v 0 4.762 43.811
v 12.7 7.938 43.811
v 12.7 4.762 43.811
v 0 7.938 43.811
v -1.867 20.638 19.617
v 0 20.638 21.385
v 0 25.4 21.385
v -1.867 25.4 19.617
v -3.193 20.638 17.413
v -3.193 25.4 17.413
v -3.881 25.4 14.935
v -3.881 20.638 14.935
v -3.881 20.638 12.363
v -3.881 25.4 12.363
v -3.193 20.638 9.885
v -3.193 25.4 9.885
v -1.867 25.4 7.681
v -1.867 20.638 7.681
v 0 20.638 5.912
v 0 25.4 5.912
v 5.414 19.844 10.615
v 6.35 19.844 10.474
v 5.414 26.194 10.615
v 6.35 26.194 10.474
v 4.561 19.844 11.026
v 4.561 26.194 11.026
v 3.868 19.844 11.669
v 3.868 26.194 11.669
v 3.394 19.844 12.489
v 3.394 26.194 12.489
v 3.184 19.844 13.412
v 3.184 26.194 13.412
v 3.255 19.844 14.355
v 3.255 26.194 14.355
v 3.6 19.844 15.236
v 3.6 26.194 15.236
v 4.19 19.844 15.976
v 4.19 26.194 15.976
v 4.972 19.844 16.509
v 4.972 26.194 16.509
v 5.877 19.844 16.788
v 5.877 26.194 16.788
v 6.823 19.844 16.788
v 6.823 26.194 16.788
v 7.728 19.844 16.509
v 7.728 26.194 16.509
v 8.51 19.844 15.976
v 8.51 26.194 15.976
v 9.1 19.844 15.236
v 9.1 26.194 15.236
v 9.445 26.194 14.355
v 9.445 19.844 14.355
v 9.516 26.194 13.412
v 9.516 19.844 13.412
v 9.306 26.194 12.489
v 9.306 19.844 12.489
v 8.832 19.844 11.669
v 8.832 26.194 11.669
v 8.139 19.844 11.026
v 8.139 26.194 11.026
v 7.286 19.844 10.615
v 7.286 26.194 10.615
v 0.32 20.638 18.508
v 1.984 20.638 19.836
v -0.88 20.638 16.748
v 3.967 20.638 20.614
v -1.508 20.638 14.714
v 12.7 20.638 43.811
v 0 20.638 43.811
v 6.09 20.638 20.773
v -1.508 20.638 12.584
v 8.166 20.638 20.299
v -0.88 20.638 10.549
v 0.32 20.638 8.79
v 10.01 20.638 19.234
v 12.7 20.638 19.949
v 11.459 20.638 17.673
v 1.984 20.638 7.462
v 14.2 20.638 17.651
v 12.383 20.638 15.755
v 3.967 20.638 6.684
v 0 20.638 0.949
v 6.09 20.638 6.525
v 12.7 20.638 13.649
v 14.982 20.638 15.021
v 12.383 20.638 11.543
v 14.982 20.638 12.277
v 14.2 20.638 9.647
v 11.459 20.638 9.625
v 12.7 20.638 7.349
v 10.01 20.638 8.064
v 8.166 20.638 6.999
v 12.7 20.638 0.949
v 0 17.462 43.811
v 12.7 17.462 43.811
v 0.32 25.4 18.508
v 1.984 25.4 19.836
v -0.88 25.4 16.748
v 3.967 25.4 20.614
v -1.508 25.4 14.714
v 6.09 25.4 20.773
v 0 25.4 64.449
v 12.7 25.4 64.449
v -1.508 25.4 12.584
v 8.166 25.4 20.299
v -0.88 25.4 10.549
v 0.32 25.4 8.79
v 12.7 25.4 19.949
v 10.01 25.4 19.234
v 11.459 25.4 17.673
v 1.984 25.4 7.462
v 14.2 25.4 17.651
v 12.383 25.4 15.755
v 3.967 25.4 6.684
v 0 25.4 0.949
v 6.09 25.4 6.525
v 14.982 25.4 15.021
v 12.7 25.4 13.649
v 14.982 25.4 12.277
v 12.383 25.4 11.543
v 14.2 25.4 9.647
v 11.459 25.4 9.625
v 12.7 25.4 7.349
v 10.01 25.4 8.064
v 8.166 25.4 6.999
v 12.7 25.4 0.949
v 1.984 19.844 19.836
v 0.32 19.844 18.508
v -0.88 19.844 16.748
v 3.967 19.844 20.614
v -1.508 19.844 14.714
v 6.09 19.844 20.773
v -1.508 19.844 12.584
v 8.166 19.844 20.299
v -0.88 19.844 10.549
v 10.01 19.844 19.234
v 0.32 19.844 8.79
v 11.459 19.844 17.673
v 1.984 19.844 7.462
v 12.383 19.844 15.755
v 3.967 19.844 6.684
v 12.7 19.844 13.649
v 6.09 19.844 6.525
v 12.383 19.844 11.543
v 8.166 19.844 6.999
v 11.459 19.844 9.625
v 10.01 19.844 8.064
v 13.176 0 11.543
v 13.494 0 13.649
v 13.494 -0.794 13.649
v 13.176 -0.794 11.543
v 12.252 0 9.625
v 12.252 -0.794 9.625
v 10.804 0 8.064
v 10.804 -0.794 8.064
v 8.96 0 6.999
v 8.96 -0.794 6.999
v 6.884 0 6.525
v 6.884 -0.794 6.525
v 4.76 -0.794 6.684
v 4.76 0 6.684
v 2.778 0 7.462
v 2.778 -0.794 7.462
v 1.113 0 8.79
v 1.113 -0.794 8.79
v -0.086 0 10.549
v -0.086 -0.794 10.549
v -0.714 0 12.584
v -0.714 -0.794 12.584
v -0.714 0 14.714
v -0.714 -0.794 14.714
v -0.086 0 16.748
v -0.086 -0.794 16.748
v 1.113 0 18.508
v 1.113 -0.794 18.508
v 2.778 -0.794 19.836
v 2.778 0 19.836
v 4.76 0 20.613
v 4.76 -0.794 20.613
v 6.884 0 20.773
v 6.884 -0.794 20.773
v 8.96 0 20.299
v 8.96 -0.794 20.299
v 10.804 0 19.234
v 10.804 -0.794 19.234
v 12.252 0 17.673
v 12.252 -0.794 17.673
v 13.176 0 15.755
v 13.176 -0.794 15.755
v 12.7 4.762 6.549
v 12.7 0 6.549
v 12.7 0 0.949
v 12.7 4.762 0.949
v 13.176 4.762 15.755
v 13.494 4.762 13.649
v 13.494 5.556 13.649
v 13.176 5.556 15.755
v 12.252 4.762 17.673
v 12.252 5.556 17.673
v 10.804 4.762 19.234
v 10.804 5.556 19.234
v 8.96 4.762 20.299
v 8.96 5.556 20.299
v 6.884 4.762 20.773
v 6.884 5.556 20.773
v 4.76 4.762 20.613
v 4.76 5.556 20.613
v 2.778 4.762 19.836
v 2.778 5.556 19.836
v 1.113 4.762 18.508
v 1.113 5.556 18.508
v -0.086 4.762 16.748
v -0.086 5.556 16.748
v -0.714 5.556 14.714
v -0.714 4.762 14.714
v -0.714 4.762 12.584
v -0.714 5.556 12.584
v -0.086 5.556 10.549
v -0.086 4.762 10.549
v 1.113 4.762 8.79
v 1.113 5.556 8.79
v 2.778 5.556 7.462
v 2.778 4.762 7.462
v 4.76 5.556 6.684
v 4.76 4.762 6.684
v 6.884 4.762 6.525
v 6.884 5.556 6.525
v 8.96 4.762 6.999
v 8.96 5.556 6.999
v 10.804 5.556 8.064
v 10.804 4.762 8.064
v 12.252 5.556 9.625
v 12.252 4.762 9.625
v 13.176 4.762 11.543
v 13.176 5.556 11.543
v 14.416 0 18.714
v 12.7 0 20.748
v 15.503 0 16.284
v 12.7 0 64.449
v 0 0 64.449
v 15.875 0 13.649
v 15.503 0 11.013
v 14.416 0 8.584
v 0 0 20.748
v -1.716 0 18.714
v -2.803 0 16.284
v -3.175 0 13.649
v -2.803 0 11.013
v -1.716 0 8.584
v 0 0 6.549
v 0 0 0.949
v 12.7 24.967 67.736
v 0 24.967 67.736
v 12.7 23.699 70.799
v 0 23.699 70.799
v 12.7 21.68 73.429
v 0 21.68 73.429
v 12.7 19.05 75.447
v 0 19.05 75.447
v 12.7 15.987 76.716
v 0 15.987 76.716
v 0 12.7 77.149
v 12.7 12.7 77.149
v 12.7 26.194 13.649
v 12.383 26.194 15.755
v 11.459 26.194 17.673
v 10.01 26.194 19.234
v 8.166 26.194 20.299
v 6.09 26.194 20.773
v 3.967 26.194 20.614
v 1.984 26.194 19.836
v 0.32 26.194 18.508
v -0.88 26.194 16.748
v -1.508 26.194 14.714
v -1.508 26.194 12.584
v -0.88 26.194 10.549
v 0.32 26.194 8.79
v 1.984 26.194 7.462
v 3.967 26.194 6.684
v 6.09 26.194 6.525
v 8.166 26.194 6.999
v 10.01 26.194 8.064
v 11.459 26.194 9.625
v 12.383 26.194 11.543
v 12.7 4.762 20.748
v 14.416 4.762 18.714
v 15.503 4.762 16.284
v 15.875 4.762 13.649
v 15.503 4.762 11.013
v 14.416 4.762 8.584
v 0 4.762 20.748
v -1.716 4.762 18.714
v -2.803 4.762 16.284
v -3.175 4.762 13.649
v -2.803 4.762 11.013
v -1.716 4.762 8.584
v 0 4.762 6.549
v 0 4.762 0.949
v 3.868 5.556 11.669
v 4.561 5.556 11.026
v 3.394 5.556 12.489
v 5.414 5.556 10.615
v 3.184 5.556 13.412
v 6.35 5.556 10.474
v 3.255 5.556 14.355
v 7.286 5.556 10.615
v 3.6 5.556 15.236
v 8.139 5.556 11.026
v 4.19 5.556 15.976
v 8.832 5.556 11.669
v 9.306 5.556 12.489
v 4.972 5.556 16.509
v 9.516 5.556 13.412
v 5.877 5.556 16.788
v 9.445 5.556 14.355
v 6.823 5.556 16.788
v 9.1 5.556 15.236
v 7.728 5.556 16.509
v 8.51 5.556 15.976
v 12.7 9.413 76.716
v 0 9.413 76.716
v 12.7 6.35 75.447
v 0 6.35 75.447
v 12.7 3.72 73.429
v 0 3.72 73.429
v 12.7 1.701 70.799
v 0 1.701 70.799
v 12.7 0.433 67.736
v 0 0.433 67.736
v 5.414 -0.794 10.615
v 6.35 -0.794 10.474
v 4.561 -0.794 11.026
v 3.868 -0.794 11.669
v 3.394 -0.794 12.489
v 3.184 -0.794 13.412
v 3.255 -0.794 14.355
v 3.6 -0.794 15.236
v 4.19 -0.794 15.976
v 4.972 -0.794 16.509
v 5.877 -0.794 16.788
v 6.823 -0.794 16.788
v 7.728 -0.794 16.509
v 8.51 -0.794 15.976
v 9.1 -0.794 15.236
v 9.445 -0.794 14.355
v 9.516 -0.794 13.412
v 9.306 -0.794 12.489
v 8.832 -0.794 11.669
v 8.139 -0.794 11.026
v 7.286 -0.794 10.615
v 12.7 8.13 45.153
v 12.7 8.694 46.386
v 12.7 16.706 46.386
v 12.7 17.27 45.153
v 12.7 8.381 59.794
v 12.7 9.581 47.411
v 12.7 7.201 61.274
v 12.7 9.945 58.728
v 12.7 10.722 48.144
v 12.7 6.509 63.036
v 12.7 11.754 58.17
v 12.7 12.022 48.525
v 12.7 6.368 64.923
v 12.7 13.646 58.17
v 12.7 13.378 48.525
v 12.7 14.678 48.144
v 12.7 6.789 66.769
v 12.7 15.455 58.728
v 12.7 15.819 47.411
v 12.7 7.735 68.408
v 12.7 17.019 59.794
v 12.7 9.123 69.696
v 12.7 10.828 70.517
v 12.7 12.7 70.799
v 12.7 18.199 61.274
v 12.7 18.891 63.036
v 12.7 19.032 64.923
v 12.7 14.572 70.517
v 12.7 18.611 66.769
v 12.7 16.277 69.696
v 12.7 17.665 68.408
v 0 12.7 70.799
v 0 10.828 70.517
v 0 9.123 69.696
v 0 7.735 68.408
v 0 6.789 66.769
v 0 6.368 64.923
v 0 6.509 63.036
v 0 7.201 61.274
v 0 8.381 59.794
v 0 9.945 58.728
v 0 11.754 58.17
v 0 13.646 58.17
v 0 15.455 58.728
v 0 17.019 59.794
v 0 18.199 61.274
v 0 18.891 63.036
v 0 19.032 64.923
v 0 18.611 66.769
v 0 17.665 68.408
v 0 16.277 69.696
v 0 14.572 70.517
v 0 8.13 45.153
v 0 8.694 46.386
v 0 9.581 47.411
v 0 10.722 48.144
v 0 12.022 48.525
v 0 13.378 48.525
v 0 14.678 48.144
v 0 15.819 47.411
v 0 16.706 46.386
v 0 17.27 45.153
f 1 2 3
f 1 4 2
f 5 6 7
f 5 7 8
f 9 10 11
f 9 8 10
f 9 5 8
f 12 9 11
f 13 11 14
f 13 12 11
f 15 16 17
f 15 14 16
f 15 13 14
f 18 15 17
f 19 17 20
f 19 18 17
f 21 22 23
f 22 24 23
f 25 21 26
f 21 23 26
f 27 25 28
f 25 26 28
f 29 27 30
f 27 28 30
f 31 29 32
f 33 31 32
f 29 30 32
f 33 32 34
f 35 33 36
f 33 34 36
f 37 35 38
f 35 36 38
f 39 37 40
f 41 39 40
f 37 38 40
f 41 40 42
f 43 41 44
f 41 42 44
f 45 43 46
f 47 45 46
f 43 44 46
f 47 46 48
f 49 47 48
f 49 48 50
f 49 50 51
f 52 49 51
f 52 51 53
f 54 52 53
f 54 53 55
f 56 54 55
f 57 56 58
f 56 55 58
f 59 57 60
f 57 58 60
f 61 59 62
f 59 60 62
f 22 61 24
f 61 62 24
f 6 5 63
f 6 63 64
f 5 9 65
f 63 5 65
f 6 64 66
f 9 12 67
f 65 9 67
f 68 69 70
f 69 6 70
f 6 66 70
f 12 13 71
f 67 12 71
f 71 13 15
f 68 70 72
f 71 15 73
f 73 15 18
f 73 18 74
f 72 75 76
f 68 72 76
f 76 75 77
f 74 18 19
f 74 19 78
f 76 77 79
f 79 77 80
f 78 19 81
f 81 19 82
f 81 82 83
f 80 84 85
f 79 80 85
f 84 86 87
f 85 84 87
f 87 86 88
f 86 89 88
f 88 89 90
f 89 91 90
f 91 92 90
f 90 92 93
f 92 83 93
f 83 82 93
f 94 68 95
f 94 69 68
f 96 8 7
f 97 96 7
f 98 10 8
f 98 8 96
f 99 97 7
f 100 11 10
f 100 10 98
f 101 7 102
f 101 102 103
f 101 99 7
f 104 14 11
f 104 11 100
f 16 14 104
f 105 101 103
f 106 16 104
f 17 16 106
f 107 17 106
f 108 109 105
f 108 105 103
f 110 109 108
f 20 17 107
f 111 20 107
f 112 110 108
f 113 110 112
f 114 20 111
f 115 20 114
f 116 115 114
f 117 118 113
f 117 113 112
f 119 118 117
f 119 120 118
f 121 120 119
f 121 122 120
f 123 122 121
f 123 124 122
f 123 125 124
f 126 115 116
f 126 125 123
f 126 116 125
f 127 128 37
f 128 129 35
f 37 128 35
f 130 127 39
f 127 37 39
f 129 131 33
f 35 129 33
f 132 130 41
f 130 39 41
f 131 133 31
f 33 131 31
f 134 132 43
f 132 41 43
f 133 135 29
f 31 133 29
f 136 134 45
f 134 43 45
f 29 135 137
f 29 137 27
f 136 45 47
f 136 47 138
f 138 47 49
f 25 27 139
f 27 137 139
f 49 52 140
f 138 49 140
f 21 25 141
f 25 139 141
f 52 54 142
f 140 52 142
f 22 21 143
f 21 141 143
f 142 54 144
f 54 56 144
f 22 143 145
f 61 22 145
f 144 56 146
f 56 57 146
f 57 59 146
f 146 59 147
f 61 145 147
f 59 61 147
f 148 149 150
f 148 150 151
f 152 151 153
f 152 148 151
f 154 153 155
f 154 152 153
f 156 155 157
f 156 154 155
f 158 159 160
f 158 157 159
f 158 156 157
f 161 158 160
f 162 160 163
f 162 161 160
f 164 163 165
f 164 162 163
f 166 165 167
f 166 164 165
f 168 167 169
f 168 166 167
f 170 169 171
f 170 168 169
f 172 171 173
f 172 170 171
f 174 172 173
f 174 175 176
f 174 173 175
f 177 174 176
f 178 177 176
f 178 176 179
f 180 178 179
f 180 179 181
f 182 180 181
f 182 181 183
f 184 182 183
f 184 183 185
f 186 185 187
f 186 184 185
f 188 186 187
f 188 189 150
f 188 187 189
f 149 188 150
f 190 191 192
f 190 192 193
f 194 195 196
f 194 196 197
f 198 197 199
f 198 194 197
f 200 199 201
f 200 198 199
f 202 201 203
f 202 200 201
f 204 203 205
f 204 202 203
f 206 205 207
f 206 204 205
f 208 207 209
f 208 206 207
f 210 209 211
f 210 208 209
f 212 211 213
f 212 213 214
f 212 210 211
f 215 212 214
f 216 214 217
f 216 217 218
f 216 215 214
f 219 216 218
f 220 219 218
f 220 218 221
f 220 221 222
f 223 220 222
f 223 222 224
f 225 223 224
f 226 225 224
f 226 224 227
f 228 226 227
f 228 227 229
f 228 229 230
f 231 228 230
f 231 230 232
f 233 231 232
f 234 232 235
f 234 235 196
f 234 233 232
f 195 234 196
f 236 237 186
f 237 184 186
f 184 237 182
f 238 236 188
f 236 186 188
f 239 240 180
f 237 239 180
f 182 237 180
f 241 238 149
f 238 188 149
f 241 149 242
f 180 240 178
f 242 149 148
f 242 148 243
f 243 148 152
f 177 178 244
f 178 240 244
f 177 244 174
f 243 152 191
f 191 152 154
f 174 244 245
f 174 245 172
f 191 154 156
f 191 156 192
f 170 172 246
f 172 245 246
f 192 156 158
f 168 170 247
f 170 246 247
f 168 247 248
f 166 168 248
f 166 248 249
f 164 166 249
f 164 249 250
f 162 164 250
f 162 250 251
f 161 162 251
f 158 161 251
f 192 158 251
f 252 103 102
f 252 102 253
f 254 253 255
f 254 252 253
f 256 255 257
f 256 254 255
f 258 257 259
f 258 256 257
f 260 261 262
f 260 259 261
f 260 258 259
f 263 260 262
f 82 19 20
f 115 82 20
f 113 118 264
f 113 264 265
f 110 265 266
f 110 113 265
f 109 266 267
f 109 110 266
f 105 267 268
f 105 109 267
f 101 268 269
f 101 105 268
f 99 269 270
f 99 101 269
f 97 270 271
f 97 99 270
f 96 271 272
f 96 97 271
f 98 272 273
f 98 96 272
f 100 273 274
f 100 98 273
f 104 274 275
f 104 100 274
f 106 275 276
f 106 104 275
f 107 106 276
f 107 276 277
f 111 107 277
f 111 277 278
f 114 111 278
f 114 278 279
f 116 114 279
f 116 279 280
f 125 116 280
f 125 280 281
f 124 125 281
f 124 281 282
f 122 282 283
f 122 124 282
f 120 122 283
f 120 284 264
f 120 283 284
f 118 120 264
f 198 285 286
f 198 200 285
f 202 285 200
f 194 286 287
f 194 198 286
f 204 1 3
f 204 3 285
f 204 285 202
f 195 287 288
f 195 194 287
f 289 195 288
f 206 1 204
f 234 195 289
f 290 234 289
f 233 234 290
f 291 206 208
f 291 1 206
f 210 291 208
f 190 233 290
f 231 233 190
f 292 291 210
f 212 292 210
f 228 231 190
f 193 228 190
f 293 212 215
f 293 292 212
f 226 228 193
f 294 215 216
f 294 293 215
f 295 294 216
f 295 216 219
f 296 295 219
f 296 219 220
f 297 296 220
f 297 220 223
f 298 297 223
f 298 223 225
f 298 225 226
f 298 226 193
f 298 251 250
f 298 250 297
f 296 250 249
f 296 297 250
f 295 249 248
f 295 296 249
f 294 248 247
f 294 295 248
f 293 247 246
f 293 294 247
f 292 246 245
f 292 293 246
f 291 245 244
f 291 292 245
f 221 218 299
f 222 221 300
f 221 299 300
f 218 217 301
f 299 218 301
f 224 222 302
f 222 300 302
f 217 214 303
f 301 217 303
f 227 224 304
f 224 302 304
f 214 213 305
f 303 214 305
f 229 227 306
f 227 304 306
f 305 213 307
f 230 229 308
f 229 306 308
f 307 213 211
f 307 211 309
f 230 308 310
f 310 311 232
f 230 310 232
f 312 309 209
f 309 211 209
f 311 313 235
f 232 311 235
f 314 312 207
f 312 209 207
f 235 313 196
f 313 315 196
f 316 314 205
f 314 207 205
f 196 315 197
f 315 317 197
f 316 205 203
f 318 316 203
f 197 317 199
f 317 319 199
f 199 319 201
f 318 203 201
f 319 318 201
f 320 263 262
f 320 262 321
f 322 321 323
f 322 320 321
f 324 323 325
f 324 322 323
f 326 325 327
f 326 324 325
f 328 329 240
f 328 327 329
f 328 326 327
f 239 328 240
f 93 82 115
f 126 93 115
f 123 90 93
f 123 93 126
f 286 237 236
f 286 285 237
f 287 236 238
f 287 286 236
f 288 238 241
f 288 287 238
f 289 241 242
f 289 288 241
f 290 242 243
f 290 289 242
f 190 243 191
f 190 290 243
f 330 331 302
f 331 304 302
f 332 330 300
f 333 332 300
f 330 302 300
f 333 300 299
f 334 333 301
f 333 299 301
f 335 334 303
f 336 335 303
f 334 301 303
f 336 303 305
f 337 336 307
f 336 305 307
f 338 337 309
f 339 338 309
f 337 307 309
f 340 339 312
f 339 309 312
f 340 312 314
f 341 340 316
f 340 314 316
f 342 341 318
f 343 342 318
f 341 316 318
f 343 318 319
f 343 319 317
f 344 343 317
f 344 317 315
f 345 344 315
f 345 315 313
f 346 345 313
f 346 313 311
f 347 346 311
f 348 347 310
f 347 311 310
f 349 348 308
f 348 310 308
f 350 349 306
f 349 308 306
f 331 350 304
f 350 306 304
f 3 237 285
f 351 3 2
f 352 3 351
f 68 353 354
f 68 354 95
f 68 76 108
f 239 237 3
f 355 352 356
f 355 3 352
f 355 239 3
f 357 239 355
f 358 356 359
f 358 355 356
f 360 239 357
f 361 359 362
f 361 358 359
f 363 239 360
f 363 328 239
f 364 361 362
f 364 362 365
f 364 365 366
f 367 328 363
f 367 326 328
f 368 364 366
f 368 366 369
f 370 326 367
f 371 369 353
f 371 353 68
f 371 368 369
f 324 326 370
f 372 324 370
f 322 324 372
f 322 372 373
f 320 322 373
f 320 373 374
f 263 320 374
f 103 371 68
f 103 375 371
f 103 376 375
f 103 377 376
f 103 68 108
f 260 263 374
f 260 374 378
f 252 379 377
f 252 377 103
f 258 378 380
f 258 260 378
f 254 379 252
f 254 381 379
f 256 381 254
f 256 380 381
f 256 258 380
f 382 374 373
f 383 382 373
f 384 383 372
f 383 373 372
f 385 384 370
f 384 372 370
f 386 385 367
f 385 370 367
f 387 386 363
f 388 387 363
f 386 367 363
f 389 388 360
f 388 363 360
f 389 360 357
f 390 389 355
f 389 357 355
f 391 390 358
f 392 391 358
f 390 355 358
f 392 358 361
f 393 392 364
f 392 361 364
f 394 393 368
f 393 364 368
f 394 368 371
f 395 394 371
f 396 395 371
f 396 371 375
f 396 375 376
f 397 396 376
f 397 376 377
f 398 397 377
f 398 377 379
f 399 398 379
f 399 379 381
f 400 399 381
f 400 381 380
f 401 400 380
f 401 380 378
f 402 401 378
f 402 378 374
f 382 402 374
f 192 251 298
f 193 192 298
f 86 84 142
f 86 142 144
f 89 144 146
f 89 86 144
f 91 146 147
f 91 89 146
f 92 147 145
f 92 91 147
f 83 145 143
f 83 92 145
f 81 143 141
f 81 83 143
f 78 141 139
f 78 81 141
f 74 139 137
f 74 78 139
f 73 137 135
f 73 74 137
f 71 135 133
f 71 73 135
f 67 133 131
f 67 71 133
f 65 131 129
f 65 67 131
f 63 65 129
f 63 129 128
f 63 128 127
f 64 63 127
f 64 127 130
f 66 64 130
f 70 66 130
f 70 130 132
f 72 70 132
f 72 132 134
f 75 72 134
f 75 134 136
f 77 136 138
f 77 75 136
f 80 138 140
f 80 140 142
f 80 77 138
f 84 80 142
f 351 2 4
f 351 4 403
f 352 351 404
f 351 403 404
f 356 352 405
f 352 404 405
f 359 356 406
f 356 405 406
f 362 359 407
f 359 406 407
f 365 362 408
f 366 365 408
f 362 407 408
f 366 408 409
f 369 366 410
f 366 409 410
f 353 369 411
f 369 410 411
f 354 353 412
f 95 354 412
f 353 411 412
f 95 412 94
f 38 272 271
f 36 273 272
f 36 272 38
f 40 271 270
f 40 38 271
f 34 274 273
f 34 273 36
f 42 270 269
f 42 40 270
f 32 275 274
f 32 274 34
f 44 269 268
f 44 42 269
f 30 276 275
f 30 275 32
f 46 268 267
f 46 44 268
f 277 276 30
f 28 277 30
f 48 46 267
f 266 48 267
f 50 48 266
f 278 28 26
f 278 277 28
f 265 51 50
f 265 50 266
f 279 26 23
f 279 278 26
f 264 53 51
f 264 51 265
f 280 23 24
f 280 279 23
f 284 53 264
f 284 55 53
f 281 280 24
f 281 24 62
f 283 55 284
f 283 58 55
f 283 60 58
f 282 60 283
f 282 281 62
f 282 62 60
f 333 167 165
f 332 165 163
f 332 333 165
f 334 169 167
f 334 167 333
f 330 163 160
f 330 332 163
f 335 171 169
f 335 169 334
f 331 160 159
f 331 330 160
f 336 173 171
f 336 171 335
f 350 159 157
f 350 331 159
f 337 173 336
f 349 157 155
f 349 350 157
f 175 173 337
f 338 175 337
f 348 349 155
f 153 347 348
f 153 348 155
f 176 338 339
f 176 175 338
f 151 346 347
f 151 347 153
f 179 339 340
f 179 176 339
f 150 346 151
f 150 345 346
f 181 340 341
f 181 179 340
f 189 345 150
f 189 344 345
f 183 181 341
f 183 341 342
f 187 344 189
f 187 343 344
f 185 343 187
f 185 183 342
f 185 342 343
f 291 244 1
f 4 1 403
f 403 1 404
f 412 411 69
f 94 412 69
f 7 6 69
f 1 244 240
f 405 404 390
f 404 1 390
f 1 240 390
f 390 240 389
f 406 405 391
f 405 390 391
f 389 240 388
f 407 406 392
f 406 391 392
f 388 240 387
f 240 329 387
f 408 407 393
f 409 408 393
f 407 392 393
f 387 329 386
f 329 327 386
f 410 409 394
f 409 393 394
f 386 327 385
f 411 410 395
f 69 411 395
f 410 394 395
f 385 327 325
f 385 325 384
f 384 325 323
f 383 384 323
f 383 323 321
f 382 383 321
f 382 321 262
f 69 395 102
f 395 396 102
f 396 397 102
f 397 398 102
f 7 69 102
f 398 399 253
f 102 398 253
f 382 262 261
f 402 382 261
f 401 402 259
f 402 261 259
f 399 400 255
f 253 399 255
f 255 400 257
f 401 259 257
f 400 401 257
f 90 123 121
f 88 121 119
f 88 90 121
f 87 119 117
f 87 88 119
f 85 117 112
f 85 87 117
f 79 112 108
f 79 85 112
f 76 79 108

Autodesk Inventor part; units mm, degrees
ref_plane "YZ Plane" through (0, 0, 0) normal (1, 0, 0) x (0, 1, 0)
ref_plane "XZ Plane" through (0, 0, 0) normal (0, 1, 0) x (-1, 0, 0)
ref_plane "XY Plane" through (0, 0, 0) normal (0, 0, 1) x (1, 0, 0)
sketch "Sketch1" plane through (0, 0, 0) normal (1, 0, 0) x (0, 1, 0)
  line L0 (0, 0.9489) -> (25.4, 0.9489)
  line L1 (25.4, 0.9489) -> (25.4, 77.1489)
  line L2 (25.4, 77.1489) -> (0, 77.1489)
  line L3 (0, 77.1489) -> (0, 0.9489)
  point P0 (0, 0)
  dimension "d0" = 25.4
  dimension "d1" = 76.2
extrude "Extrusion1" add sketch "Sketch1" along normal blind 12.7
sketch "Sketch2" plane through (0, 0, 0) normal (-1, 0, 0) x (0, 0, 1)
  line L0 (77.1489, 25.4) -> (77.1489, 0) projected
  line L1 (0.9489, 25.4) -> (77.1489, 25.4) projected
  point P0 (0, 0)
  point P1 (64.4489, 12.7)
  dimension "d4" = 12.7
  dimension "d5" = 12.7
hole "Hole1" at (0, 12.7, 64.4489) direction (1, 0, 0) diameter 12.7 end through all
fillet "Fillet1" radius 12.7 2 edges at (6.35, 25.4, 77.1489) (6.35, 0, 77.1489)
sketch "Sketch3" plane through (0, 0, 0) normal (-1, 0, 0) x (0, 0, 1)
  line L0 (0.9489, 25.4) -> (64.4489, 25.4) projected
  line L1 (0.9489, 0) -> (0.9489, 25.4) projected
  line L2 (64.4489, 0) -> (0.9489, 0) projected
  line L3 (0.9489, 20.6375) -> (43.8114, 20.6375)
  line L4 (43.8114, 4.7625) -> (0.9489, 4.7625)
  line L5 (0.9489, 4.7625) -> (0.9489, 20.6375)
  arc A0 (43.8114, 7.9375) -> (43.8114, 17.4625) centre (43.8114, 12.7) ccw
  line L6 (43.8114, 20.6375) -> (43.8114, 17.4625)
  line L7 (43.8114, 7.9375) -> (43.8114, 4.7625)
  point P0 (0, 0)
  dimension "d15" = 4.7625
  dimension "d16" = 4.7625
  dimension "d18" = 3.175
  dimension "d19" = 3.175
  dimension "d20" = 4.7625
  dimension "d21" = 42.8625
extrude "Extrusion2" cut sketch "Sketch3" against normal through all
sketch "Sketch4" plane through (0, 0, 0.9489) normal (0, -1, 0) x (1, 0, 0)
  line L0 (0, 0) -> (12.7, 0) projected
  circle A0 centre (6.35, 12.7) radius 9.525
  line L1 (12.7, 63.5) -> (12.7, 0) projected
  point P0 (0, -0.9489)
  dimension "d24" = 12.7
  dimension "d25" = 19.05
  dimension "d49" = 6.35
extrude "Extrusion3" add sketch "Sketch4" along normal up to surface (4.7625 mm away) from surface at -4.7625
sketch "Sketch5" plane through (0, 25.4, 0.9489) normal (0, 1, 0) x (1, 0, 0)
  circle A0 centre (5.5563, -12.7) radius 9.525
  point P0 (12.7, 0)
  point P1 (0, 0.9489)
  dimension "d28" = 19.05
  dimension "d29" = 12.7
extrude "Extrusion4" add sketch "Sketch5" along normal up to surface (4.7625 mm away) from surface at -4.7625
sketch "Sketch6" plane through (0, 25.4, 0.9489) normal (0, 1, 0) x (1, 0, 0)
  arc A0 (12.7, -19.0002) -> (12.7, -6.3998) centre (5.5563, -12.7) ccw projected
  circle A1 centre (5.5563, -12.7) radius 7.1438
  point P0 (0, 0.9489)
  dimension "d32" = 14.2875
extrude "Extrusion5" add sketch "Sketch6" along normal blind 0.7937 and the other way blind 5.5563
sketch "Sketch7" plane through (0, 0, 0.9489) normal (0, -1, 0) x (1, 0, 0)
  arc A0 (12.7, 5.6005) -> (12.7, 19.7995) centre (6.35, 12.7) ccw projected
  circle A1 centre (6.35, 12.7) radius 7.1437
  point P0 (0, -0.9489)
  dimension "d37" = 14.2875
extrude "Extrusion6" add sketch "Sketch7" along normal blind 0.7937 and the other way blind 5.5563
sketch "Sketch8" plane through (6.35, -0.7938, 13.6489) normal (0, -1, 0) x (1, 0, 0)
  circle A0 centre (0, 0) radius 7.1437 projected
  point P0 (-6.35, -13.6489)
hole "Hole2" at (6.35, -0.7938, 13.6489) direction (0, 1, 0) diameter 6.35 end through all
properties part number "pulley hook" material "Acetal Resin, Black"
